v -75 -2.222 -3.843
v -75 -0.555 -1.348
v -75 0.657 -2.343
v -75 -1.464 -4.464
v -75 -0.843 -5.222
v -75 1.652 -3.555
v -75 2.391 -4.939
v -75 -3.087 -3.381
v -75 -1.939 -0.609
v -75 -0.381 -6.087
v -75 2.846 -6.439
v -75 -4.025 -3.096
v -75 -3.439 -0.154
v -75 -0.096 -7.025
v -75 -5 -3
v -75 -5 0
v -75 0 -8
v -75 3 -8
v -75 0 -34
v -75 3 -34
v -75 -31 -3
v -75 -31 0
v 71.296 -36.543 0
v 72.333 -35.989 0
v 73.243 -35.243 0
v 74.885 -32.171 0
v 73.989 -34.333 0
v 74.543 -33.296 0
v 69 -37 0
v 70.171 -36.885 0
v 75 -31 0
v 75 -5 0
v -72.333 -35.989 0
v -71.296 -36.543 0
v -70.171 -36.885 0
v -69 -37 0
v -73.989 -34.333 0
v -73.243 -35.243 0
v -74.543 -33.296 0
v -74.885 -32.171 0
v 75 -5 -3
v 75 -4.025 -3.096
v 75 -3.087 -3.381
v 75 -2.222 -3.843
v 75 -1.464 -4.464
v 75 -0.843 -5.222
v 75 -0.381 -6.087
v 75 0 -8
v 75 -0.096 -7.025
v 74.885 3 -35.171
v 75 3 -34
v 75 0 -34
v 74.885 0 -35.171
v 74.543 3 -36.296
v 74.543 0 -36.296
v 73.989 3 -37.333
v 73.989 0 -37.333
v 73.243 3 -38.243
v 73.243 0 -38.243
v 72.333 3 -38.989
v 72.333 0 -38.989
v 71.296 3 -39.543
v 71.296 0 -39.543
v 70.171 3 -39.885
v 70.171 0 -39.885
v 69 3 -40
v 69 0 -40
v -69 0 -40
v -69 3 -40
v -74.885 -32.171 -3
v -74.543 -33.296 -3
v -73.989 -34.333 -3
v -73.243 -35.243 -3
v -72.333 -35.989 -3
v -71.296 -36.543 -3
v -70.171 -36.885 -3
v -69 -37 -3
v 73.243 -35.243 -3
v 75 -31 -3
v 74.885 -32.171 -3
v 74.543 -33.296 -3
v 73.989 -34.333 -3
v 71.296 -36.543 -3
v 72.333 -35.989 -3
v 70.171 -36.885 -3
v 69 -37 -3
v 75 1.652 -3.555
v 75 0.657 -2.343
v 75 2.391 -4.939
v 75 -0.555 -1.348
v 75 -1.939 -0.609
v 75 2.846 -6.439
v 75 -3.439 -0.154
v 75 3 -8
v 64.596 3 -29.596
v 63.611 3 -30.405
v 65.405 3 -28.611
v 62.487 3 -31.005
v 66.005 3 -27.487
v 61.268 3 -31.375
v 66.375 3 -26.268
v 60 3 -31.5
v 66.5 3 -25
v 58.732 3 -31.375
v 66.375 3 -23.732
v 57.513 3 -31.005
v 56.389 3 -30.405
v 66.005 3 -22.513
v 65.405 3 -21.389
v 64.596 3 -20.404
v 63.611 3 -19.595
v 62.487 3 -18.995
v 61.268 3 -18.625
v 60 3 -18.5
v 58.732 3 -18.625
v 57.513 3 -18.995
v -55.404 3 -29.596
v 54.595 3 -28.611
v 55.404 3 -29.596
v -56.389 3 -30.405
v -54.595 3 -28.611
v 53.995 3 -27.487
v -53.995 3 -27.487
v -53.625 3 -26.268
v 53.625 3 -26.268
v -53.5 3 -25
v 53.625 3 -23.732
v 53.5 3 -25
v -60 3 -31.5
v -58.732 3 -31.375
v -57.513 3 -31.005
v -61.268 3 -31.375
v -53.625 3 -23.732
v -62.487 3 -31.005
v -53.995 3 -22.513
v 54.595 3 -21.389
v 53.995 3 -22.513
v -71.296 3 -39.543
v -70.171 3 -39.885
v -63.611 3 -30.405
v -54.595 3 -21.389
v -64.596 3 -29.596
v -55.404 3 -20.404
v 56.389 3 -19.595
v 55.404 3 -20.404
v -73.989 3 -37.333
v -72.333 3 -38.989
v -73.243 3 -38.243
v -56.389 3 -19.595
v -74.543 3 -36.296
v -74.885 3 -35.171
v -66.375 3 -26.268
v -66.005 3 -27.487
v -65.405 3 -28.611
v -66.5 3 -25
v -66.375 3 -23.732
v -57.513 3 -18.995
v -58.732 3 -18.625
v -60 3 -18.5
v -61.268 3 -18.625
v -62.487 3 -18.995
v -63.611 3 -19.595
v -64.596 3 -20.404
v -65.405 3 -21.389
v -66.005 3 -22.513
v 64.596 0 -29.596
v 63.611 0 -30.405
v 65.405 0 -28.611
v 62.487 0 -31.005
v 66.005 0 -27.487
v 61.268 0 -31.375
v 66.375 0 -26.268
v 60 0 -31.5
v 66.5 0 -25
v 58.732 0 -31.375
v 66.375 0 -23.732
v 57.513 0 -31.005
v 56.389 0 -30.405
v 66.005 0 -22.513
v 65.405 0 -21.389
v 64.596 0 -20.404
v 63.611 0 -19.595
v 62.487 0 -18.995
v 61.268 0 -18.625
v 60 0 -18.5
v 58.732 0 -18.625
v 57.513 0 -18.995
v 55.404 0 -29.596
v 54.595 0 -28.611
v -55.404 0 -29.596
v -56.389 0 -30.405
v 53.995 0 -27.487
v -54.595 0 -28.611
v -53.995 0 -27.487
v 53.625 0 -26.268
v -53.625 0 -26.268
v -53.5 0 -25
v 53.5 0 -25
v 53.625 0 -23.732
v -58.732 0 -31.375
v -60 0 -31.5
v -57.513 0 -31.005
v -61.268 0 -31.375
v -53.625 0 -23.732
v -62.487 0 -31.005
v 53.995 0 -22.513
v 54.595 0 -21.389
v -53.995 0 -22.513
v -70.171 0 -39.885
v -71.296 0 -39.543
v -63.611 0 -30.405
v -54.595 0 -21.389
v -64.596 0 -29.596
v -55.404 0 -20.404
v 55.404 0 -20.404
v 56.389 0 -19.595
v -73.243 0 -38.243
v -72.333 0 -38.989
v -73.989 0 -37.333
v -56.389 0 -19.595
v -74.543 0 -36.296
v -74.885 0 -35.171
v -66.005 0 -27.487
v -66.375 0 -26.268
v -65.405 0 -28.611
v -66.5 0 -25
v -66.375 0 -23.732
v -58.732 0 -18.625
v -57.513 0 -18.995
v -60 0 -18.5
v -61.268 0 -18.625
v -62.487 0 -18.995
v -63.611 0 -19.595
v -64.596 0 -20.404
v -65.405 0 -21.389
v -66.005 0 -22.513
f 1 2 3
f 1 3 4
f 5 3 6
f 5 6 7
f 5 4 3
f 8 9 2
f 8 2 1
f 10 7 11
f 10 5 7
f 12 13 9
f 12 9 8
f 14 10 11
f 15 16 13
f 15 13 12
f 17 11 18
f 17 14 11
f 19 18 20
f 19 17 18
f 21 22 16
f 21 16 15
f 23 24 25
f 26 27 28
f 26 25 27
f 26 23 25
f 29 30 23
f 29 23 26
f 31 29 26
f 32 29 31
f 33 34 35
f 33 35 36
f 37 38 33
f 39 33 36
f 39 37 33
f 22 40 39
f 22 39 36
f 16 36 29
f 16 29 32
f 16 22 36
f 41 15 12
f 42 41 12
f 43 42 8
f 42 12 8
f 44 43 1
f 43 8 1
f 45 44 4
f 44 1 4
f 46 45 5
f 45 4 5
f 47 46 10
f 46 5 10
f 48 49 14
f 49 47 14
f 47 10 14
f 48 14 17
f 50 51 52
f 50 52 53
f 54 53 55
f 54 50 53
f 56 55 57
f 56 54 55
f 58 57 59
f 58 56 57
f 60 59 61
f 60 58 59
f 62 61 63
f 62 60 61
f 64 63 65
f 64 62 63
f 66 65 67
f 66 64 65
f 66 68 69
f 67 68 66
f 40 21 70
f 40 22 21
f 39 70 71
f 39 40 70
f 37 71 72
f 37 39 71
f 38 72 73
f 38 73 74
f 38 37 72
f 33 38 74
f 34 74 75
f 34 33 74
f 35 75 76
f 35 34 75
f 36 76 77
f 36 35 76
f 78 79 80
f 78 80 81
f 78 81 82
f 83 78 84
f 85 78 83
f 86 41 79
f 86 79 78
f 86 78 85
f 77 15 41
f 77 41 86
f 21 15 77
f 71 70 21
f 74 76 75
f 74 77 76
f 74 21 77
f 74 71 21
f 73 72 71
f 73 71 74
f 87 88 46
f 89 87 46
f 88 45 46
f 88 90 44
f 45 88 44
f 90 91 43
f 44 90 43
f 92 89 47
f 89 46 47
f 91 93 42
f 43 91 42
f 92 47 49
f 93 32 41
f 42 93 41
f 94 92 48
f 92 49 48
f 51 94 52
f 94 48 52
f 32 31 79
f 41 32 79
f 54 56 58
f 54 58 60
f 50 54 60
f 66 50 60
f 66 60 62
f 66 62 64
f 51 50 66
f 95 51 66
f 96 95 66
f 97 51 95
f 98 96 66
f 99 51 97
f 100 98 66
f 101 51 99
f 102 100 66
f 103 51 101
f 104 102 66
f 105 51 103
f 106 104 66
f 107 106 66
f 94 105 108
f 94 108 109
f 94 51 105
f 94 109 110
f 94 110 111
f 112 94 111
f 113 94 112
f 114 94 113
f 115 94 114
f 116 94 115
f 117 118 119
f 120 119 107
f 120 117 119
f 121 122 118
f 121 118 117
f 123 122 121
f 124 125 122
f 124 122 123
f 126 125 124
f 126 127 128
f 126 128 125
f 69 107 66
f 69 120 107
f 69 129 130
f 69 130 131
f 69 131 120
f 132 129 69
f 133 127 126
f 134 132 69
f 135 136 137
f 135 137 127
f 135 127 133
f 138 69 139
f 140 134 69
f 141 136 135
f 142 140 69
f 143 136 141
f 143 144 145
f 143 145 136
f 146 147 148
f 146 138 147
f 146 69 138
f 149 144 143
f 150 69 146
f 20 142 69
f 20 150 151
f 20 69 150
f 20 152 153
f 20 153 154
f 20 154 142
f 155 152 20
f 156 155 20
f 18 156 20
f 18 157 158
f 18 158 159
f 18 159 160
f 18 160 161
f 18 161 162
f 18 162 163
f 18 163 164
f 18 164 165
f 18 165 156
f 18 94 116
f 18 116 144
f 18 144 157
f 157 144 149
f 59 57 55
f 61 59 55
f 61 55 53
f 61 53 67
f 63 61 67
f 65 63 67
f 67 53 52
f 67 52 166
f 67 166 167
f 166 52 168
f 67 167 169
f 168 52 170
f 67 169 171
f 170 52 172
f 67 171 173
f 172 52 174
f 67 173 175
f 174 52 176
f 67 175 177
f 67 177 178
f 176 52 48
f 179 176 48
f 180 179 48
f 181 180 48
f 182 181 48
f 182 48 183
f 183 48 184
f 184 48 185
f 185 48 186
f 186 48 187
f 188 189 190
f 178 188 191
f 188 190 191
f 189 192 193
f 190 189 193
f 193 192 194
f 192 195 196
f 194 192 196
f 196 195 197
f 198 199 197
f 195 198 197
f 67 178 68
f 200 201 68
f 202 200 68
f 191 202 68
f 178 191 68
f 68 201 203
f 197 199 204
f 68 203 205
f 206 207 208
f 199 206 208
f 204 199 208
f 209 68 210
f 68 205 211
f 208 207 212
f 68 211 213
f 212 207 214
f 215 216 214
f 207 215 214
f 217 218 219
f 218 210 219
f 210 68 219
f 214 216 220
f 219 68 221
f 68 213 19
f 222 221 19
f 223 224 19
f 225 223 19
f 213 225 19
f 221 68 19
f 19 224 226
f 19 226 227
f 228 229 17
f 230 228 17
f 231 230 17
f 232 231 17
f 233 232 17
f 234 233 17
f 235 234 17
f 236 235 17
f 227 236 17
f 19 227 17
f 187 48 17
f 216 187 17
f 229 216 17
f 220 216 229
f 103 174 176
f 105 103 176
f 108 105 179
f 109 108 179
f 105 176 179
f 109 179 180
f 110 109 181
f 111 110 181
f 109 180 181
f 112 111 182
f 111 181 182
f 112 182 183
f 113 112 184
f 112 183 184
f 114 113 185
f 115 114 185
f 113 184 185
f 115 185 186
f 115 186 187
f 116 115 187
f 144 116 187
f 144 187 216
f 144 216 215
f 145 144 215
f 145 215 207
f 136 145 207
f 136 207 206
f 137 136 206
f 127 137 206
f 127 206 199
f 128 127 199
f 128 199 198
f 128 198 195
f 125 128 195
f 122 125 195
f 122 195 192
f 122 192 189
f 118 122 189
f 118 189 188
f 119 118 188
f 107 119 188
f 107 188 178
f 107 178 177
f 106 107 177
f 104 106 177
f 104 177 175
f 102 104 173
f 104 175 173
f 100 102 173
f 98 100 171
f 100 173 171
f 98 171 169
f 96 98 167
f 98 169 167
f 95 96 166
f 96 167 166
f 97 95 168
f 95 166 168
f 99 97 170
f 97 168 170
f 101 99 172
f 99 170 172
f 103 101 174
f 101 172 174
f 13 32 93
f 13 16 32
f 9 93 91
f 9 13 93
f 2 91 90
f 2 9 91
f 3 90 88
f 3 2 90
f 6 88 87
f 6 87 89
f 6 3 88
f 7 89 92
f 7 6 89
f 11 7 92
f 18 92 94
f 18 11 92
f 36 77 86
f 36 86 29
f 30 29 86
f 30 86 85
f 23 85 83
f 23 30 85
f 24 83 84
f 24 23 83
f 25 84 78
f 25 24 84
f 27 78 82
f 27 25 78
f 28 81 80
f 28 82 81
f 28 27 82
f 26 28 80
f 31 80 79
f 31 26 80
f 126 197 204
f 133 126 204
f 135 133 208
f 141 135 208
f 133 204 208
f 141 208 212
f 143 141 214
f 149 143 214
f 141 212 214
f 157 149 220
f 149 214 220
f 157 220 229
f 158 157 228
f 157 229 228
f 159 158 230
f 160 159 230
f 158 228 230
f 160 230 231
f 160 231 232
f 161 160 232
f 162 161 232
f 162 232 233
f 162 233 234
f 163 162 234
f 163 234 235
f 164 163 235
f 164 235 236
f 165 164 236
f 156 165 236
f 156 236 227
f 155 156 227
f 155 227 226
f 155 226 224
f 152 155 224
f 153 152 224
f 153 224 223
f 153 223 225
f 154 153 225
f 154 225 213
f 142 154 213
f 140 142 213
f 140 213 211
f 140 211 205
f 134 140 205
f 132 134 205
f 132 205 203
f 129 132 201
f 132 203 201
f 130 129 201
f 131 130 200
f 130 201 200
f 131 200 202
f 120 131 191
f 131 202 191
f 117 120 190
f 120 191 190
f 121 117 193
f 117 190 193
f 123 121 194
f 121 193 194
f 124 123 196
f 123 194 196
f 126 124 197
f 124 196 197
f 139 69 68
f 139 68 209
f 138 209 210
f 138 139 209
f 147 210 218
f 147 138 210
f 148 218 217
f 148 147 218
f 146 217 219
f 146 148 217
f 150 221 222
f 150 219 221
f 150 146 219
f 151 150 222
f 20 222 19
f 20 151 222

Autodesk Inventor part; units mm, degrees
ref_plane "YZ Plane" through (0, 0, 0) normal (1, 0, 0) x (0, 1, 0)
ref_plane "XZ Plane" through (0, 0, 0) normal (0, 1, 0) x (-1, 0, 0)
ref_plane "XY Plane" through (0, 0, 0) normal (0, 0, 1) x (1, 0, 0)
sketch "Sketch4" plane through (0, 0, 0) normal (0, 1, 0) x (-1, 0, 0)
  line L0 (75, -40) -> (-75, -40)
  line L1 (-75, -40) -> (-75, 0)
  line L2 (-75, 0) -> (75, 0)
  line L3 (75, 0) -> (75, -40)
  point P0 (0, 0)
  point P1 (0, 0)
  dimension "d36" = 150
  dimension "d37" = 40
extrude "Plate2" add sketch "Sketch4" along normal blind 3
sketch "Sketch5" plane through (0, 0, 0) normal (0, -1, 0) x (1, 0, 0)
  circle A0 centre (-60, -25) radius 6.5
  circle A1 centre (60, -25) radius 6.5
  line L0 (0, 0) -> (0, -40) construction
  line L1 (75, -40) -> (-75, -40) construction
  dimension "d39" = 120
  dimension "d40" = 15
  dimension "d41" = 13
extrude "Cut1" cut sketch "Sketch5" against normal blind 3
sketch "Sketch6" plane through (-75, 3, -3) normal (0, 0, 1) x (1, 0, 0)
  line L0 (150, 0) -> (0, 0)
  line L1 (0, 0) -> (0, -40)
  line L2 (0, -40) -> (150, -40)
  line L3 (150, -40) -> (150, 0)
edge flange "Flange1" height 40 angle 90 thickness 3 bend radius 5 thickness toward (0, 0, 1) relief round relief width 3 relief depth 1.5 edges at (0, 0, 0) wall of the first edge with corners at (75, 3, -3) (-75, 3, -3) (-75, -37, -3) (75, -37, -3)
bend "Bend1"
corner "Corner1"
fillet "Corner Round6" radius 6 4 edges at (75, -37, -1.5) (-75, 1.5, -40) (75, 1.5, -40) (-75, -37, -1.5)
equation "\"d42\" = Thickness"
equation "\"d38\" = Thickness"
equation "\"d44\" = BendReliefWidth"
equation "\"d45\" = BendReliefDepth"
equation "\"d46\" = MinimumRemnant"
equation "\"d47\" = TransitionRadius"
equation "\"d50\" = BendRadius"
equation "\"d51\" = CornerReliefSize"
equation "\"d52\" = GapSize"
equation "\"d53\" = JacobiRadiusSize"
equation "\"BendReliefWidth\" = Thickness"
equation "\"BendReliefDepth\" = 0.5 * Thickness"
equation "\"CornerReliefSize\" = 4 * Thickness"
equation "\"MinimumRemnant\" = 2 * Thickness"
equation "\"TransitionRadius\" = BendRadius"
equation "\"JacobiRadiusSize\" = BendRadius"
equation "\"GapSize\" = Thickness"
equation "\"Thickness\" = 3"
equation "\"BendRadius\" = 5"
properties part number "NDM-VOS 712 flange" material "Stainless Steel"
